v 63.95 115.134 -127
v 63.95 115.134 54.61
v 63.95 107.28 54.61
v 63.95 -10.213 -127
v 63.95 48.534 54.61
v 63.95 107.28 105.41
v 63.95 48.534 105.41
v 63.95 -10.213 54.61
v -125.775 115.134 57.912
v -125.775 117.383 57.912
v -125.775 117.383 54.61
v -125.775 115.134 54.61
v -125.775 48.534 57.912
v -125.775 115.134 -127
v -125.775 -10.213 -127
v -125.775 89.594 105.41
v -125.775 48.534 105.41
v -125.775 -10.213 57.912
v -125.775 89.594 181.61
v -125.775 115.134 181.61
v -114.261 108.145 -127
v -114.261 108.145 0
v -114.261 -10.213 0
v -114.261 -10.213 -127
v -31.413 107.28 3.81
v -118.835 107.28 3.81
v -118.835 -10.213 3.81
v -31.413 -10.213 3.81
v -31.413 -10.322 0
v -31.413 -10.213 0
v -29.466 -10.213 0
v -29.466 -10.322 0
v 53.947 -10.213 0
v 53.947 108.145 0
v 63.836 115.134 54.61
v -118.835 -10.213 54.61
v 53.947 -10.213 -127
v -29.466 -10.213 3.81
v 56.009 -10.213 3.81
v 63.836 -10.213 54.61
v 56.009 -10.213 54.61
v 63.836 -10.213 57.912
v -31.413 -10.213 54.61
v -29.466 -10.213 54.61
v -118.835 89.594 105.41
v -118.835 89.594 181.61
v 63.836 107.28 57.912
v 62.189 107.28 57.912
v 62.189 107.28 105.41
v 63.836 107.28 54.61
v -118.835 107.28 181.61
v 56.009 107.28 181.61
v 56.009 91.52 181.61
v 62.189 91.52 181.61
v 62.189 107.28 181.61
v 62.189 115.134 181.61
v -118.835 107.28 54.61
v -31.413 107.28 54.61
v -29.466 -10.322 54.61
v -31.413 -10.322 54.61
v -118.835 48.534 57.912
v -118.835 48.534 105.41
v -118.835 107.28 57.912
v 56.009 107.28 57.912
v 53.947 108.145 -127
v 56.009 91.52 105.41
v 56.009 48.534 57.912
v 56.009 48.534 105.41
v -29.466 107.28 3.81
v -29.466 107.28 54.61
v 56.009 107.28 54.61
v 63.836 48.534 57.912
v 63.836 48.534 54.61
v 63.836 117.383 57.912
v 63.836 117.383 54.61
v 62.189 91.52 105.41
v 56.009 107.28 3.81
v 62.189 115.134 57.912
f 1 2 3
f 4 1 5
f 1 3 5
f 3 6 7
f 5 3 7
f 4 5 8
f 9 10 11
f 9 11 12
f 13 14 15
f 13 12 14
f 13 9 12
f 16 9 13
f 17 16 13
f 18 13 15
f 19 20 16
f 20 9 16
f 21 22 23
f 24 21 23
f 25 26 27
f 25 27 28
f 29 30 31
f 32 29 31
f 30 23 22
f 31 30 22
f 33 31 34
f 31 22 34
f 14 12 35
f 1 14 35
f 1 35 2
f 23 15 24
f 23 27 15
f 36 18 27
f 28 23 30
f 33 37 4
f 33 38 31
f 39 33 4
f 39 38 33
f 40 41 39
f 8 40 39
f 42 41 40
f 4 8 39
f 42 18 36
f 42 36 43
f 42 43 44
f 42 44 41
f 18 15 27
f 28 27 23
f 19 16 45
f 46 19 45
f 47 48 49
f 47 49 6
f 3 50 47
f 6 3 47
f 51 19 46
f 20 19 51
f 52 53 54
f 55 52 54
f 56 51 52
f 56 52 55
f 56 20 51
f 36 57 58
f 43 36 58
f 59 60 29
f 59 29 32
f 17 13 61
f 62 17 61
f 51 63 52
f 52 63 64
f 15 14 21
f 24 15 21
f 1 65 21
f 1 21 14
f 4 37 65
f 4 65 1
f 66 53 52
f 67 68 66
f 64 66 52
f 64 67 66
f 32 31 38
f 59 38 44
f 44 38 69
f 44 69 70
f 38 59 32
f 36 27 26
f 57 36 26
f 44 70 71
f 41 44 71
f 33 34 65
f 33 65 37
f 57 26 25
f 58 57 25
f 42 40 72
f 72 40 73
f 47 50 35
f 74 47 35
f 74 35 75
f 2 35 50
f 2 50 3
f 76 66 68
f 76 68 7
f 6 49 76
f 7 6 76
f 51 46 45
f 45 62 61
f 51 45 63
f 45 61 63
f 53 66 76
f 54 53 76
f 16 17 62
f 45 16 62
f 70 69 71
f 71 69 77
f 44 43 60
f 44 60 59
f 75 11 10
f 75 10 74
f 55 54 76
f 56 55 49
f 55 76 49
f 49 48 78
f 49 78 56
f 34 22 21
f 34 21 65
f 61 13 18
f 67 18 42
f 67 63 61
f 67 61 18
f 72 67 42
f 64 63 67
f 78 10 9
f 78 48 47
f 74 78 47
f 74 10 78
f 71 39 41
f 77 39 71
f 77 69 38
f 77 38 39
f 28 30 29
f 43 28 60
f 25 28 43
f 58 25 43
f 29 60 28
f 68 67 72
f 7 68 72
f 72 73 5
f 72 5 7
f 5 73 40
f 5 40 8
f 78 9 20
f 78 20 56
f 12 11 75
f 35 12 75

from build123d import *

# Parameters (mm, degrees)
F0_W      = 189.7254064679
F0_H      = 125.3468897194
F1_DEPTH  = 3.81
F2_W      = 6.9400146604
F2_H      = 125.3468897194
F3_DEPTH  = 50.8
F4_W      = 7.941737771
F4_H      = 125.3468897194
F5_DEPTH  = 50.8
F6_W      = 181.0236349702
F6_H      = 7.8539922833
F7_DEPTH  = 177.8
F8_W      = 6.9400146604
F8_H      = 66.6004410014
F9_DEPTH  = 50.8
F10_W     = 6.9400146604
F10_H     = 25.5400016904
F11_DEPTH = 76.2
F12_W     = 7.941737771
F12_H     = 58.746448718
F13_DEPTH = 50.8
F14_W     = 6.1799809337
F14_H     = 15.7597959042
F15_DEPTH = 76.2
F16_W     = 189.6112561226
F16_H     = 127.5956835598
F17_DEPTH = 3.302
F18_W     = 1.9466541708
F18_H     = 54.61
F19_DEPTH = 117.602
F20_W     = 11.5141570568
F20_H     = 125.3468897194
F21_DEPTH = 127
F22_W     = 10.0032910705
F22_H     = 125.3468897194
F23_DEPTH = 127
F24_W     = 178.803190589
F24_H     = 6.9889426231
F25_DEPTH = 127


with BuildPart() as f1:
    # F0 (on Top) → F1 (new body)
    with BuildSketch(Plane.XY):
        with Locations((-30.9122316539, 52.4606974795)):
            Rectangle(F0_W, F0_H)
    extrude(amount=F1_DEPTH)

    # F2 (on face) → F3 (join)
    with BuildSketch(Plane.XY.offset(3.81)):
        with Locations((-122.3049275577, 52.4606974795)):
            Rectangle(F2_W, F2_H)
    extrude(amount=F3_DEPTH)

    # F4 (on face) → F5 (join)
    with BuildSketch(Plane.XY.offset(3.81)):
        with Locations((59.9796026945, 52.4606974795)):
            Rectangle(F4_W, F4_H)
    extrude(amount=F5_DEPTH)

    # F6 (on face) → F7 (join)
    with BuildSketch(Plane.XY.offset(3.81)):
        with Locations((-28.3231027424, 111.2071461976)):
            Rectangle(F6_W, F6_H)
    extrude(amount=F7_DEPTH)

    # F8 (on face) → F9 (join)
    with BuildSketch(Plane.XY.offset(54.61)):
        with Locations((-122.3049275577, 81.8339218386)):
            Rectangle(F8_W, F8_H)
    extrude(amount=F9_DEPTH)

    # F10 (on face) → F11 (join)
    with BuildSketch(Plane.XY.offset(105.41)):
        with Locations((-122.3049275577, 102.364141494)):
            Rectangle(F10_W, F10_H)
    extrude(amount=F11_DEPTH)

    # F12 (on face) → F13 (join)
    with BuildSketch(Plane.XY.offset(54.61)):
        with Locations((59.9796026945, 77.9069256969)):
            Rectangle(F12_W, F12_H)
    extrude(amount=F13_DEPTH)

    # F14 (on face) → F15 (join)
    with BuildSketch(Plane.XY.offset(105.41)):
        with Locations((59.0987242758, 99.4002521038)):
            Rectangle(F14_W, F14_H)
    extrude(amount=F15_DEPTH)

    # F16 (on face) → F17 (join)
    with BuildSketch(Plane.XY.offset(54.61)):
        with Locations((-30.9693068266, 53.5850943998)):
            Rectangle(F16_W, F16_H)
    extrude(amount=F17_DEPTH)

    # F18 (on face) → F19 (join)
    with BuildSketch(Plane.XZ.offset(-107.2801500559)):
        with Locations((-30.4397661239, 27.305)):
            Rectangle(F18_W, F18_H)
    extrude(amount=F19_DEPTH)

    # F20 (on face) → F21 (join)
    with BuildSketch(Plane(origin=(0, 0, 0), x_dir=(1, 0, 0), z_dir=(0, 0, -1))):
        with Locations((-120.0178563595, -52.4606974795)):
            Rectangle(F20_W, F20_H)
    extrude(amount=F21_DEPTH)

    # F22 (on face) → F23 (join)
    with BuildSketch(Plane(origin=(0, 0, 0), x_dir=(1, 0, 0), z_dir=(0, 0, -1))):
        with Locations((58.9488260448, -52.4606974795)):
            Rectangle(F22_W, F22_H)
    extrude(amount=F23_DEPTH)

    # F24 (on face) → F25 (join)
    with BuildSketch(Plane(origin=(0, 0, 0), x_dir=(1, 0, 0), z_dir=(0, 0, -1))):
        with Locations((-35.4544147849, -111.6396710277)):
            Rectangle(F24_W, F24_H)
    extrude(amount=F25_DEPTH)


solid = f1.part
